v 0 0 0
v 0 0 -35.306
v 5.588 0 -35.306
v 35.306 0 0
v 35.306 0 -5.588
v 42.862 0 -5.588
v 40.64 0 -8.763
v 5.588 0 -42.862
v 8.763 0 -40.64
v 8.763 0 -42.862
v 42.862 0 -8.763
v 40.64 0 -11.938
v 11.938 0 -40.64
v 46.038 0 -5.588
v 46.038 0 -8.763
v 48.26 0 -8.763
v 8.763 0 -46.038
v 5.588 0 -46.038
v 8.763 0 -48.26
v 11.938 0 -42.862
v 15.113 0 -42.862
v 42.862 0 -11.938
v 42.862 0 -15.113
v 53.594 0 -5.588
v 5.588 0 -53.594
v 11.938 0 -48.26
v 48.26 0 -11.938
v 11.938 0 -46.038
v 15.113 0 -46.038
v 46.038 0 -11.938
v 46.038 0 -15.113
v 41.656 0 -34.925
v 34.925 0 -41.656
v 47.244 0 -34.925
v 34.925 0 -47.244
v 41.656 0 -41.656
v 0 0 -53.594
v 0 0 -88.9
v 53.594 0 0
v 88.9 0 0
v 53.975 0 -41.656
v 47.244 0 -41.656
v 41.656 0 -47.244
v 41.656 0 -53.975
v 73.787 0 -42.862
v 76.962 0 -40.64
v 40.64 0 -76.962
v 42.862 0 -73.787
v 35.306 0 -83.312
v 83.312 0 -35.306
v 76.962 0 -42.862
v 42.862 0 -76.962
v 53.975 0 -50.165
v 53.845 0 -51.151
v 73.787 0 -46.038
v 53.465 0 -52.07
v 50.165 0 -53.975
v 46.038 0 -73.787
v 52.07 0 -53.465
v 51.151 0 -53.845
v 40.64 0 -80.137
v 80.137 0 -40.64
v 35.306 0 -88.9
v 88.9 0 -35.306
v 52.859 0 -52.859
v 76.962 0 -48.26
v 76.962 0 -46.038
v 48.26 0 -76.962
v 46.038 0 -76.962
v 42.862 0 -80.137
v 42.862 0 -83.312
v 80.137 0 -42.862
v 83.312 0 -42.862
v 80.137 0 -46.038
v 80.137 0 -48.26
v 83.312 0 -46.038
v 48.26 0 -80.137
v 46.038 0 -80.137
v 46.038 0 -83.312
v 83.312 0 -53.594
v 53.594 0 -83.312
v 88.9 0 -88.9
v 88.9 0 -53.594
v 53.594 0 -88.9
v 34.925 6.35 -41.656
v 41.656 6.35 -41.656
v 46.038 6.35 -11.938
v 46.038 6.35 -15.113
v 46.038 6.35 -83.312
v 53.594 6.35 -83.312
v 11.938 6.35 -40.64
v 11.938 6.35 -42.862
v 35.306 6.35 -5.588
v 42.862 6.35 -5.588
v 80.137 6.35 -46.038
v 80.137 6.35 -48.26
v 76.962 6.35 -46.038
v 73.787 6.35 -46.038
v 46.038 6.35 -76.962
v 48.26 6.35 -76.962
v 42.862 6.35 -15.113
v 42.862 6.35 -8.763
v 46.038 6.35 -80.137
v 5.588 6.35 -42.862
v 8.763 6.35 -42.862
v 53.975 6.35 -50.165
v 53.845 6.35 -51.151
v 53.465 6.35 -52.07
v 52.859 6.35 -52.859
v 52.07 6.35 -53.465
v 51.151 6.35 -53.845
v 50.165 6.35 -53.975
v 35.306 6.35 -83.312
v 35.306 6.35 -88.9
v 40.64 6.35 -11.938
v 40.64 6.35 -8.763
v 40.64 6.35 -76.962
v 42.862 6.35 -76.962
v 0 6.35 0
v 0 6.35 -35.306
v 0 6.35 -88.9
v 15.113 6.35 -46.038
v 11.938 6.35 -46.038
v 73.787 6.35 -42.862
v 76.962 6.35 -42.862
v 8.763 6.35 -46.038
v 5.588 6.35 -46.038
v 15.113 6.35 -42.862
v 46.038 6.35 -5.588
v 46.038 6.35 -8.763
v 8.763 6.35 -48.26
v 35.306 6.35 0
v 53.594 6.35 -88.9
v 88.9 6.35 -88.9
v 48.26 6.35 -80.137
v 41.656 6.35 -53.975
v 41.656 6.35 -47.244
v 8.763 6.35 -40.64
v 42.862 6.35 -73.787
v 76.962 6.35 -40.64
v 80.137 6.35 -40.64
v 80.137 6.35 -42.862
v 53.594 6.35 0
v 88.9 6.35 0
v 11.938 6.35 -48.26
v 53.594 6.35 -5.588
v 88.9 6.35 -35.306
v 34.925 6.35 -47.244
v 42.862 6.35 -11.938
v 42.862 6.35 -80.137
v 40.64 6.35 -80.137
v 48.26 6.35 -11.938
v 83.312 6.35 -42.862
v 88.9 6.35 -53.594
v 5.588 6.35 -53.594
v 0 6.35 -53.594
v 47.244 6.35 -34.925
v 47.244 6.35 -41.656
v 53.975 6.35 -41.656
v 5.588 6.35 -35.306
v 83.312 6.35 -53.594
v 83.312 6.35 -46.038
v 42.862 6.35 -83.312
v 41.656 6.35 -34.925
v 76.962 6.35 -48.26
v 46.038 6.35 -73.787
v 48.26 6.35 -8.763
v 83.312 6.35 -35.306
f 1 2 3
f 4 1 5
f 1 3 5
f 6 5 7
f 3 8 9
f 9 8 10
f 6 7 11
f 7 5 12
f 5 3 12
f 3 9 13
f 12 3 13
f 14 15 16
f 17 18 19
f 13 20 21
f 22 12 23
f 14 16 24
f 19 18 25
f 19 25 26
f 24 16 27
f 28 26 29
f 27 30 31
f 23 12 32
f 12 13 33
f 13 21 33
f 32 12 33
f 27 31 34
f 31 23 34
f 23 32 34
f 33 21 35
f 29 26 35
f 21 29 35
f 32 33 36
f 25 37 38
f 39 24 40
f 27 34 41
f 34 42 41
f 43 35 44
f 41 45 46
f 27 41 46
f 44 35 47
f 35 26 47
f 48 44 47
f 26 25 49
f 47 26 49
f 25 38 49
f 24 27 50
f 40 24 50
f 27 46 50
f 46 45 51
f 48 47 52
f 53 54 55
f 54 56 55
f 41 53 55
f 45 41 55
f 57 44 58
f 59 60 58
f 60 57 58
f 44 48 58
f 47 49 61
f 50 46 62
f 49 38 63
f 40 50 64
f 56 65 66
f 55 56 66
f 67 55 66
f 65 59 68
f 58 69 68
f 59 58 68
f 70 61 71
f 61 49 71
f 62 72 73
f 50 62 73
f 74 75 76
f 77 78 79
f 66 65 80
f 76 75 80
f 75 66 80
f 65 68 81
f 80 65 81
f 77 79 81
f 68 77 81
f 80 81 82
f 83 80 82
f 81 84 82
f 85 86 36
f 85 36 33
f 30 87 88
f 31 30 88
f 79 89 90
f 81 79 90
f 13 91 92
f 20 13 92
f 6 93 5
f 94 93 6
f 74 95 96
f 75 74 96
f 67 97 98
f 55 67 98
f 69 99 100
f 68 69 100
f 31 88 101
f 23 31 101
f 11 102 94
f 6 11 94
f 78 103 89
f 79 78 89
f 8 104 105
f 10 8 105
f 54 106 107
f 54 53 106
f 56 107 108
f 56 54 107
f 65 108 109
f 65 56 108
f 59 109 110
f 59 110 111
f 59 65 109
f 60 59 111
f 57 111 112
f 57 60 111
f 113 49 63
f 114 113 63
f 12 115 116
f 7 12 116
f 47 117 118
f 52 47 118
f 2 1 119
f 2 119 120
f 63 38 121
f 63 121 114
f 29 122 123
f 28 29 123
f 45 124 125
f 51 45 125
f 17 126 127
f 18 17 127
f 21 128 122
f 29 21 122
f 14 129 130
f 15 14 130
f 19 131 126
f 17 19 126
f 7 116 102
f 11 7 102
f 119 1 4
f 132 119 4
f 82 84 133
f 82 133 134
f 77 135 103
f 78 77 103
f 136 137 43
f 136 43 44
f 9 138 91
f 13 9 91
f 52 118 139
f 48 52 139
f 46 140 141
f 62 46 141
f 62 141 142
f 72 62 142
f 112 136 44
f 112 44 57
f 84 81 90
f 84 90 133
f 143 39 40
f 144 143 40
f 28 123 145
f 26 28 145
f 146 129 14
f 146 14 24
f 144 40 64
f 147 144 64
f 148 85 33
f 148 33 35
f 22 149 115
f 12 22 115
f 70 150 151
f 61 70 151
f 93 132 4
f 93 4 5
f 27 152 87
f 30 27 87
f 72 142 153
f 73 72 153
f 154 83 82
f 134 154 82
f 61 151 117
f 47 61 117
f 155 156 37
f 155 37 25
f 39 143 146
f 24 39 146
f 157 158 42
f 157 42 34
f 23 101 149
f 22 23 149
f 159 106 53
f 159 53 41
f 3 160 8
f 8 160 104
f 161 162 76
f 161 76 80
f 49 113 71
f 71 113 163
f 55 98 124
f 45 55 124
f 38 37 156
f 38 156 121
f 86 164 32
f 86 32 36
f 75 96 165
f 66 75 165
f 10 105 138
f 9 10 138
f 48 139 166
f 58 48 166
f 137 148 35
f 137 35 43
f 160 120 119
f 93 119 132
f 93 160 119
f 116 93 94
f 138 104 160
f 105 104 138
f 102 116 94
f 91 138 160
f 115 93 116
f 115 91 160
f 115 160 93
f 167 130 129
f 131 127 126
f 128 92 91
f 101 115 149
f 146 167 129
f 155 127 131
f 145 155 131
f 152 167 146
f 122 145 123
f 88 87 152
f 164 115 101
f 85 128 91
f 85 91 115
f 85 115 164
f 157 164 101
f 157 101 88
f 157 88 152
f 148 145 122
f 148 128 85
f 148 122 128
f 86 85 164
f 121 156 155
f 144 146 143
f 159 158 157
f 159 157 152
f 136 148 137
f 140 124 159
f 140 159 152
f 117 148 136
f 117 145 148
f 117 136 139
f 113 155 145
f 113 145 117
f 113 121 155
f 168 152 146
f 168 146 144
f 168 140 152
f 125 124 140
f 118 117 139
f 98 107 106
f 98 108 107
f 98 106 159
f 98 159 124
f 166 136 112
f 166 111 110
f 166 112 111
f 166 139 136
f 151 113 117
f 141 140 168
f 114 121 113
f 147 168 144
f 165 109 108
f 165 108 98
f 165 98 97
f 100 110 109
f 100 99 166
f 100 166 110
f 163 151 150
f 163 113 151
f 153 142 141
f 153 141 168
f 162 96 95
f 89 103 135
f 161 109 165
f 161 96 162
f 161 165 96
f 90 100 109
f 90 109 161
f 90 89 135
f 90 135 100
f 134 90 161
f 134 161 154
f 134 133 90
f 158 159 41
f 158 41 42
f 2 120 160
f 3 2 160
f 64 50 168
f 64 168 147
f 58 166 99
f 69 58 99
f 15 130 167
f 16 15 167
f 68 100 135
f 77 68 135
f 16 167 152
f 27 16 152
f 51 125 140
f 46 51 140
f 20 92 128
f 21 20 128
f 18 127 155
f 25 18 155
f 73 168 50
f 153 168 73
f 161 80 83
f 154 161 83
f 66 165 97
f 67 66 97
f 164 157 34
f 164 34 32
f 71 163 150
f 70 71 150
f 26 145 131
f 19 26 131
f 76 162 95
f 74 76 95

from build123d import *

# Parameters (mm, degrees)
SKETCH1_W           = 88.9
SKETCH1_H           = 88.9
BOSS_EXTRUDE1_DEPTH = 6.35
CUT_EXTRUDE3_DEPTH  = 126.88384527
SKETCH4_W           = 18.288
SKETCH4_H           = 5.588
SKETCH4_W_2         = 5.588
SKETCH4_H_2         = 18.288
CUT_EXTRUDE2_DEPTH  = 126.88384527
SKETCH7_W           = 6.731
SKETCH7_H           = 6.731
CUT_EXTRUDE4_DEPTH  = 126.88384527
FILLET1_R           = 3.81
CUT_EXTRUDE5_DEPTH  = 126.88384527


with BuildPart() as part:
    # Sketch1 → Boss-Extrude1 (new body)
    with BuildSketch(Plane(origin=(0, 0, 0), x_dir=(1, 0, 0), z_dir=(0, 1, 0))):
        with Locations((44.45, 44.45)):
            Rectangle(SKETCH1_W, SKETCH1_H)
    extrude(amount=BOSS_EXTRUDE1_DEPTH)

    # Sketch5 → Cut-Extrude3 (cut, through all)
    with BuildSketch(Plane(origin=(0, 6.35, 0), x_dir=(1, 0, 0), z_dir=(0, 1, 0))):
        Polygon((41.656, 47.244), (41.656, 53.975), (47.244, 53.975), (47.244, 47.244), (53.975, 47.244), (53.975, 41.656), (47.244, 41.656), (47.244, 34.925), (41.656, 34.925), (41.656, 41.656), (34.925, 41.656), (34.925, 47.244), align=None)
    extrude(amount=-CUT_EXTRUDE3_DEPTH, mode=Mode.SUBTRACT)

    # Sketch4 → Cut-Extrude2 (cut, through all)
    with BuildSketch(Plane(origin=(0, 6.35, 0), x_dir=(1, 0, 0), z_dir=(0, 1, 0))):
        with Locations((44.45, 86.106)):
            Rectangle(SKETCH4_W, SKETCH4_H)
        with Locations((86.106, 44.45)):
            Rectangle(SKETCH4_W_2, SKETCH4_H_2)
        with Locations((44.45, 2.794)):
            Rectangle(SKETCH4_W, SKETCH4_H)
        with Locations((2.794, 44.45)):
            Rectangle(SKETCH4_W_2, SKETCH4_H_2)
    extrude(amount=-CUT_EXTRUDE2_DEPTH, mode=Mode.SUBTRACT)

    # Sketch7 → Cut-Extrude4 (cut, through all)
    with BuildSketch(Plane(origin=(0, 6.35, 0), x_dir=(1, 0, 0), z_dir=(0, 1, 0))):
        with Locations((50.6095, 50.6095)):
            Rectangle(SKETCH7_W, SKETCH7_H)
    extrude(amount=-CUT_EXTRUDE4_DEPTH, mode=Mode.SUBTRACT)

    # Fillet1
    fillet1_edges = [part.edges().sort_by_distance(p)[0] for p in [
        (53.975, 3.175, -53.975),
    ]]
    fillet(fillet1_edges, radius=FILLET1_R)

    # Sketch8 → Cut-Extrude5 (cut, through all)
    with BuildSketch(Plane(origin=(0, 6.35, 0), x_dir=(1, 0, 0), z_dir=(0, 1, 0))):
        Polygon((5.588, 42.8625), (8.763, 42.8625), (8.763, 40.64), (11.938, 40.64), (11.938, 42.8625), (15.113, 42.8625), (15.113, 46.0375), (11.938, 46.0375), (11.938, 48.26), (8.763, 48.26), (8.763, 46.0375), (5.588, 46.0375), align=None)
        Polygon((42.8625, 83.312), (42.8625, 80.137), (40.64, 80.137), (40.64, 76.962), (42.8625, 76.962), (42.8625, 73.787), (46.0375, 73.787), (46.0375, 76.962), (48.26, 76.962), (48.26, 80.137), (46.0375, 80.137), (46.0375, 83.312), align=None)
        Polygon((83.312, 46.0375), (80.137, 46.0375), (80.137, 48.26), (76.962, 48.26), (76.962, 46.0375), (73.787, 46.0375), (73.787, 42.8625), (76.962, 42.8625), (76.962, 40.64), (80.137, 40.64), (80.137, 42.8625), (83.312, 42.8625), align=None)
        Polygon((46.0375, 5.588), (46.0375, 8.763), (48.26, 8.763), (48.26, 11.938), (46.0375, 11.938), (46.0375, 15.113), (42.8625, 15.113), (42.8625, 11.938), (40.64, 11.938), (40.64, 8.763), (42.8625, 8.763), (42.8625, 5.588), align=None)
    extrude(amount=-CUT_EXTRUDE5_DEPTH, mode=Mode.SUBTRACT)


solid = part.part
